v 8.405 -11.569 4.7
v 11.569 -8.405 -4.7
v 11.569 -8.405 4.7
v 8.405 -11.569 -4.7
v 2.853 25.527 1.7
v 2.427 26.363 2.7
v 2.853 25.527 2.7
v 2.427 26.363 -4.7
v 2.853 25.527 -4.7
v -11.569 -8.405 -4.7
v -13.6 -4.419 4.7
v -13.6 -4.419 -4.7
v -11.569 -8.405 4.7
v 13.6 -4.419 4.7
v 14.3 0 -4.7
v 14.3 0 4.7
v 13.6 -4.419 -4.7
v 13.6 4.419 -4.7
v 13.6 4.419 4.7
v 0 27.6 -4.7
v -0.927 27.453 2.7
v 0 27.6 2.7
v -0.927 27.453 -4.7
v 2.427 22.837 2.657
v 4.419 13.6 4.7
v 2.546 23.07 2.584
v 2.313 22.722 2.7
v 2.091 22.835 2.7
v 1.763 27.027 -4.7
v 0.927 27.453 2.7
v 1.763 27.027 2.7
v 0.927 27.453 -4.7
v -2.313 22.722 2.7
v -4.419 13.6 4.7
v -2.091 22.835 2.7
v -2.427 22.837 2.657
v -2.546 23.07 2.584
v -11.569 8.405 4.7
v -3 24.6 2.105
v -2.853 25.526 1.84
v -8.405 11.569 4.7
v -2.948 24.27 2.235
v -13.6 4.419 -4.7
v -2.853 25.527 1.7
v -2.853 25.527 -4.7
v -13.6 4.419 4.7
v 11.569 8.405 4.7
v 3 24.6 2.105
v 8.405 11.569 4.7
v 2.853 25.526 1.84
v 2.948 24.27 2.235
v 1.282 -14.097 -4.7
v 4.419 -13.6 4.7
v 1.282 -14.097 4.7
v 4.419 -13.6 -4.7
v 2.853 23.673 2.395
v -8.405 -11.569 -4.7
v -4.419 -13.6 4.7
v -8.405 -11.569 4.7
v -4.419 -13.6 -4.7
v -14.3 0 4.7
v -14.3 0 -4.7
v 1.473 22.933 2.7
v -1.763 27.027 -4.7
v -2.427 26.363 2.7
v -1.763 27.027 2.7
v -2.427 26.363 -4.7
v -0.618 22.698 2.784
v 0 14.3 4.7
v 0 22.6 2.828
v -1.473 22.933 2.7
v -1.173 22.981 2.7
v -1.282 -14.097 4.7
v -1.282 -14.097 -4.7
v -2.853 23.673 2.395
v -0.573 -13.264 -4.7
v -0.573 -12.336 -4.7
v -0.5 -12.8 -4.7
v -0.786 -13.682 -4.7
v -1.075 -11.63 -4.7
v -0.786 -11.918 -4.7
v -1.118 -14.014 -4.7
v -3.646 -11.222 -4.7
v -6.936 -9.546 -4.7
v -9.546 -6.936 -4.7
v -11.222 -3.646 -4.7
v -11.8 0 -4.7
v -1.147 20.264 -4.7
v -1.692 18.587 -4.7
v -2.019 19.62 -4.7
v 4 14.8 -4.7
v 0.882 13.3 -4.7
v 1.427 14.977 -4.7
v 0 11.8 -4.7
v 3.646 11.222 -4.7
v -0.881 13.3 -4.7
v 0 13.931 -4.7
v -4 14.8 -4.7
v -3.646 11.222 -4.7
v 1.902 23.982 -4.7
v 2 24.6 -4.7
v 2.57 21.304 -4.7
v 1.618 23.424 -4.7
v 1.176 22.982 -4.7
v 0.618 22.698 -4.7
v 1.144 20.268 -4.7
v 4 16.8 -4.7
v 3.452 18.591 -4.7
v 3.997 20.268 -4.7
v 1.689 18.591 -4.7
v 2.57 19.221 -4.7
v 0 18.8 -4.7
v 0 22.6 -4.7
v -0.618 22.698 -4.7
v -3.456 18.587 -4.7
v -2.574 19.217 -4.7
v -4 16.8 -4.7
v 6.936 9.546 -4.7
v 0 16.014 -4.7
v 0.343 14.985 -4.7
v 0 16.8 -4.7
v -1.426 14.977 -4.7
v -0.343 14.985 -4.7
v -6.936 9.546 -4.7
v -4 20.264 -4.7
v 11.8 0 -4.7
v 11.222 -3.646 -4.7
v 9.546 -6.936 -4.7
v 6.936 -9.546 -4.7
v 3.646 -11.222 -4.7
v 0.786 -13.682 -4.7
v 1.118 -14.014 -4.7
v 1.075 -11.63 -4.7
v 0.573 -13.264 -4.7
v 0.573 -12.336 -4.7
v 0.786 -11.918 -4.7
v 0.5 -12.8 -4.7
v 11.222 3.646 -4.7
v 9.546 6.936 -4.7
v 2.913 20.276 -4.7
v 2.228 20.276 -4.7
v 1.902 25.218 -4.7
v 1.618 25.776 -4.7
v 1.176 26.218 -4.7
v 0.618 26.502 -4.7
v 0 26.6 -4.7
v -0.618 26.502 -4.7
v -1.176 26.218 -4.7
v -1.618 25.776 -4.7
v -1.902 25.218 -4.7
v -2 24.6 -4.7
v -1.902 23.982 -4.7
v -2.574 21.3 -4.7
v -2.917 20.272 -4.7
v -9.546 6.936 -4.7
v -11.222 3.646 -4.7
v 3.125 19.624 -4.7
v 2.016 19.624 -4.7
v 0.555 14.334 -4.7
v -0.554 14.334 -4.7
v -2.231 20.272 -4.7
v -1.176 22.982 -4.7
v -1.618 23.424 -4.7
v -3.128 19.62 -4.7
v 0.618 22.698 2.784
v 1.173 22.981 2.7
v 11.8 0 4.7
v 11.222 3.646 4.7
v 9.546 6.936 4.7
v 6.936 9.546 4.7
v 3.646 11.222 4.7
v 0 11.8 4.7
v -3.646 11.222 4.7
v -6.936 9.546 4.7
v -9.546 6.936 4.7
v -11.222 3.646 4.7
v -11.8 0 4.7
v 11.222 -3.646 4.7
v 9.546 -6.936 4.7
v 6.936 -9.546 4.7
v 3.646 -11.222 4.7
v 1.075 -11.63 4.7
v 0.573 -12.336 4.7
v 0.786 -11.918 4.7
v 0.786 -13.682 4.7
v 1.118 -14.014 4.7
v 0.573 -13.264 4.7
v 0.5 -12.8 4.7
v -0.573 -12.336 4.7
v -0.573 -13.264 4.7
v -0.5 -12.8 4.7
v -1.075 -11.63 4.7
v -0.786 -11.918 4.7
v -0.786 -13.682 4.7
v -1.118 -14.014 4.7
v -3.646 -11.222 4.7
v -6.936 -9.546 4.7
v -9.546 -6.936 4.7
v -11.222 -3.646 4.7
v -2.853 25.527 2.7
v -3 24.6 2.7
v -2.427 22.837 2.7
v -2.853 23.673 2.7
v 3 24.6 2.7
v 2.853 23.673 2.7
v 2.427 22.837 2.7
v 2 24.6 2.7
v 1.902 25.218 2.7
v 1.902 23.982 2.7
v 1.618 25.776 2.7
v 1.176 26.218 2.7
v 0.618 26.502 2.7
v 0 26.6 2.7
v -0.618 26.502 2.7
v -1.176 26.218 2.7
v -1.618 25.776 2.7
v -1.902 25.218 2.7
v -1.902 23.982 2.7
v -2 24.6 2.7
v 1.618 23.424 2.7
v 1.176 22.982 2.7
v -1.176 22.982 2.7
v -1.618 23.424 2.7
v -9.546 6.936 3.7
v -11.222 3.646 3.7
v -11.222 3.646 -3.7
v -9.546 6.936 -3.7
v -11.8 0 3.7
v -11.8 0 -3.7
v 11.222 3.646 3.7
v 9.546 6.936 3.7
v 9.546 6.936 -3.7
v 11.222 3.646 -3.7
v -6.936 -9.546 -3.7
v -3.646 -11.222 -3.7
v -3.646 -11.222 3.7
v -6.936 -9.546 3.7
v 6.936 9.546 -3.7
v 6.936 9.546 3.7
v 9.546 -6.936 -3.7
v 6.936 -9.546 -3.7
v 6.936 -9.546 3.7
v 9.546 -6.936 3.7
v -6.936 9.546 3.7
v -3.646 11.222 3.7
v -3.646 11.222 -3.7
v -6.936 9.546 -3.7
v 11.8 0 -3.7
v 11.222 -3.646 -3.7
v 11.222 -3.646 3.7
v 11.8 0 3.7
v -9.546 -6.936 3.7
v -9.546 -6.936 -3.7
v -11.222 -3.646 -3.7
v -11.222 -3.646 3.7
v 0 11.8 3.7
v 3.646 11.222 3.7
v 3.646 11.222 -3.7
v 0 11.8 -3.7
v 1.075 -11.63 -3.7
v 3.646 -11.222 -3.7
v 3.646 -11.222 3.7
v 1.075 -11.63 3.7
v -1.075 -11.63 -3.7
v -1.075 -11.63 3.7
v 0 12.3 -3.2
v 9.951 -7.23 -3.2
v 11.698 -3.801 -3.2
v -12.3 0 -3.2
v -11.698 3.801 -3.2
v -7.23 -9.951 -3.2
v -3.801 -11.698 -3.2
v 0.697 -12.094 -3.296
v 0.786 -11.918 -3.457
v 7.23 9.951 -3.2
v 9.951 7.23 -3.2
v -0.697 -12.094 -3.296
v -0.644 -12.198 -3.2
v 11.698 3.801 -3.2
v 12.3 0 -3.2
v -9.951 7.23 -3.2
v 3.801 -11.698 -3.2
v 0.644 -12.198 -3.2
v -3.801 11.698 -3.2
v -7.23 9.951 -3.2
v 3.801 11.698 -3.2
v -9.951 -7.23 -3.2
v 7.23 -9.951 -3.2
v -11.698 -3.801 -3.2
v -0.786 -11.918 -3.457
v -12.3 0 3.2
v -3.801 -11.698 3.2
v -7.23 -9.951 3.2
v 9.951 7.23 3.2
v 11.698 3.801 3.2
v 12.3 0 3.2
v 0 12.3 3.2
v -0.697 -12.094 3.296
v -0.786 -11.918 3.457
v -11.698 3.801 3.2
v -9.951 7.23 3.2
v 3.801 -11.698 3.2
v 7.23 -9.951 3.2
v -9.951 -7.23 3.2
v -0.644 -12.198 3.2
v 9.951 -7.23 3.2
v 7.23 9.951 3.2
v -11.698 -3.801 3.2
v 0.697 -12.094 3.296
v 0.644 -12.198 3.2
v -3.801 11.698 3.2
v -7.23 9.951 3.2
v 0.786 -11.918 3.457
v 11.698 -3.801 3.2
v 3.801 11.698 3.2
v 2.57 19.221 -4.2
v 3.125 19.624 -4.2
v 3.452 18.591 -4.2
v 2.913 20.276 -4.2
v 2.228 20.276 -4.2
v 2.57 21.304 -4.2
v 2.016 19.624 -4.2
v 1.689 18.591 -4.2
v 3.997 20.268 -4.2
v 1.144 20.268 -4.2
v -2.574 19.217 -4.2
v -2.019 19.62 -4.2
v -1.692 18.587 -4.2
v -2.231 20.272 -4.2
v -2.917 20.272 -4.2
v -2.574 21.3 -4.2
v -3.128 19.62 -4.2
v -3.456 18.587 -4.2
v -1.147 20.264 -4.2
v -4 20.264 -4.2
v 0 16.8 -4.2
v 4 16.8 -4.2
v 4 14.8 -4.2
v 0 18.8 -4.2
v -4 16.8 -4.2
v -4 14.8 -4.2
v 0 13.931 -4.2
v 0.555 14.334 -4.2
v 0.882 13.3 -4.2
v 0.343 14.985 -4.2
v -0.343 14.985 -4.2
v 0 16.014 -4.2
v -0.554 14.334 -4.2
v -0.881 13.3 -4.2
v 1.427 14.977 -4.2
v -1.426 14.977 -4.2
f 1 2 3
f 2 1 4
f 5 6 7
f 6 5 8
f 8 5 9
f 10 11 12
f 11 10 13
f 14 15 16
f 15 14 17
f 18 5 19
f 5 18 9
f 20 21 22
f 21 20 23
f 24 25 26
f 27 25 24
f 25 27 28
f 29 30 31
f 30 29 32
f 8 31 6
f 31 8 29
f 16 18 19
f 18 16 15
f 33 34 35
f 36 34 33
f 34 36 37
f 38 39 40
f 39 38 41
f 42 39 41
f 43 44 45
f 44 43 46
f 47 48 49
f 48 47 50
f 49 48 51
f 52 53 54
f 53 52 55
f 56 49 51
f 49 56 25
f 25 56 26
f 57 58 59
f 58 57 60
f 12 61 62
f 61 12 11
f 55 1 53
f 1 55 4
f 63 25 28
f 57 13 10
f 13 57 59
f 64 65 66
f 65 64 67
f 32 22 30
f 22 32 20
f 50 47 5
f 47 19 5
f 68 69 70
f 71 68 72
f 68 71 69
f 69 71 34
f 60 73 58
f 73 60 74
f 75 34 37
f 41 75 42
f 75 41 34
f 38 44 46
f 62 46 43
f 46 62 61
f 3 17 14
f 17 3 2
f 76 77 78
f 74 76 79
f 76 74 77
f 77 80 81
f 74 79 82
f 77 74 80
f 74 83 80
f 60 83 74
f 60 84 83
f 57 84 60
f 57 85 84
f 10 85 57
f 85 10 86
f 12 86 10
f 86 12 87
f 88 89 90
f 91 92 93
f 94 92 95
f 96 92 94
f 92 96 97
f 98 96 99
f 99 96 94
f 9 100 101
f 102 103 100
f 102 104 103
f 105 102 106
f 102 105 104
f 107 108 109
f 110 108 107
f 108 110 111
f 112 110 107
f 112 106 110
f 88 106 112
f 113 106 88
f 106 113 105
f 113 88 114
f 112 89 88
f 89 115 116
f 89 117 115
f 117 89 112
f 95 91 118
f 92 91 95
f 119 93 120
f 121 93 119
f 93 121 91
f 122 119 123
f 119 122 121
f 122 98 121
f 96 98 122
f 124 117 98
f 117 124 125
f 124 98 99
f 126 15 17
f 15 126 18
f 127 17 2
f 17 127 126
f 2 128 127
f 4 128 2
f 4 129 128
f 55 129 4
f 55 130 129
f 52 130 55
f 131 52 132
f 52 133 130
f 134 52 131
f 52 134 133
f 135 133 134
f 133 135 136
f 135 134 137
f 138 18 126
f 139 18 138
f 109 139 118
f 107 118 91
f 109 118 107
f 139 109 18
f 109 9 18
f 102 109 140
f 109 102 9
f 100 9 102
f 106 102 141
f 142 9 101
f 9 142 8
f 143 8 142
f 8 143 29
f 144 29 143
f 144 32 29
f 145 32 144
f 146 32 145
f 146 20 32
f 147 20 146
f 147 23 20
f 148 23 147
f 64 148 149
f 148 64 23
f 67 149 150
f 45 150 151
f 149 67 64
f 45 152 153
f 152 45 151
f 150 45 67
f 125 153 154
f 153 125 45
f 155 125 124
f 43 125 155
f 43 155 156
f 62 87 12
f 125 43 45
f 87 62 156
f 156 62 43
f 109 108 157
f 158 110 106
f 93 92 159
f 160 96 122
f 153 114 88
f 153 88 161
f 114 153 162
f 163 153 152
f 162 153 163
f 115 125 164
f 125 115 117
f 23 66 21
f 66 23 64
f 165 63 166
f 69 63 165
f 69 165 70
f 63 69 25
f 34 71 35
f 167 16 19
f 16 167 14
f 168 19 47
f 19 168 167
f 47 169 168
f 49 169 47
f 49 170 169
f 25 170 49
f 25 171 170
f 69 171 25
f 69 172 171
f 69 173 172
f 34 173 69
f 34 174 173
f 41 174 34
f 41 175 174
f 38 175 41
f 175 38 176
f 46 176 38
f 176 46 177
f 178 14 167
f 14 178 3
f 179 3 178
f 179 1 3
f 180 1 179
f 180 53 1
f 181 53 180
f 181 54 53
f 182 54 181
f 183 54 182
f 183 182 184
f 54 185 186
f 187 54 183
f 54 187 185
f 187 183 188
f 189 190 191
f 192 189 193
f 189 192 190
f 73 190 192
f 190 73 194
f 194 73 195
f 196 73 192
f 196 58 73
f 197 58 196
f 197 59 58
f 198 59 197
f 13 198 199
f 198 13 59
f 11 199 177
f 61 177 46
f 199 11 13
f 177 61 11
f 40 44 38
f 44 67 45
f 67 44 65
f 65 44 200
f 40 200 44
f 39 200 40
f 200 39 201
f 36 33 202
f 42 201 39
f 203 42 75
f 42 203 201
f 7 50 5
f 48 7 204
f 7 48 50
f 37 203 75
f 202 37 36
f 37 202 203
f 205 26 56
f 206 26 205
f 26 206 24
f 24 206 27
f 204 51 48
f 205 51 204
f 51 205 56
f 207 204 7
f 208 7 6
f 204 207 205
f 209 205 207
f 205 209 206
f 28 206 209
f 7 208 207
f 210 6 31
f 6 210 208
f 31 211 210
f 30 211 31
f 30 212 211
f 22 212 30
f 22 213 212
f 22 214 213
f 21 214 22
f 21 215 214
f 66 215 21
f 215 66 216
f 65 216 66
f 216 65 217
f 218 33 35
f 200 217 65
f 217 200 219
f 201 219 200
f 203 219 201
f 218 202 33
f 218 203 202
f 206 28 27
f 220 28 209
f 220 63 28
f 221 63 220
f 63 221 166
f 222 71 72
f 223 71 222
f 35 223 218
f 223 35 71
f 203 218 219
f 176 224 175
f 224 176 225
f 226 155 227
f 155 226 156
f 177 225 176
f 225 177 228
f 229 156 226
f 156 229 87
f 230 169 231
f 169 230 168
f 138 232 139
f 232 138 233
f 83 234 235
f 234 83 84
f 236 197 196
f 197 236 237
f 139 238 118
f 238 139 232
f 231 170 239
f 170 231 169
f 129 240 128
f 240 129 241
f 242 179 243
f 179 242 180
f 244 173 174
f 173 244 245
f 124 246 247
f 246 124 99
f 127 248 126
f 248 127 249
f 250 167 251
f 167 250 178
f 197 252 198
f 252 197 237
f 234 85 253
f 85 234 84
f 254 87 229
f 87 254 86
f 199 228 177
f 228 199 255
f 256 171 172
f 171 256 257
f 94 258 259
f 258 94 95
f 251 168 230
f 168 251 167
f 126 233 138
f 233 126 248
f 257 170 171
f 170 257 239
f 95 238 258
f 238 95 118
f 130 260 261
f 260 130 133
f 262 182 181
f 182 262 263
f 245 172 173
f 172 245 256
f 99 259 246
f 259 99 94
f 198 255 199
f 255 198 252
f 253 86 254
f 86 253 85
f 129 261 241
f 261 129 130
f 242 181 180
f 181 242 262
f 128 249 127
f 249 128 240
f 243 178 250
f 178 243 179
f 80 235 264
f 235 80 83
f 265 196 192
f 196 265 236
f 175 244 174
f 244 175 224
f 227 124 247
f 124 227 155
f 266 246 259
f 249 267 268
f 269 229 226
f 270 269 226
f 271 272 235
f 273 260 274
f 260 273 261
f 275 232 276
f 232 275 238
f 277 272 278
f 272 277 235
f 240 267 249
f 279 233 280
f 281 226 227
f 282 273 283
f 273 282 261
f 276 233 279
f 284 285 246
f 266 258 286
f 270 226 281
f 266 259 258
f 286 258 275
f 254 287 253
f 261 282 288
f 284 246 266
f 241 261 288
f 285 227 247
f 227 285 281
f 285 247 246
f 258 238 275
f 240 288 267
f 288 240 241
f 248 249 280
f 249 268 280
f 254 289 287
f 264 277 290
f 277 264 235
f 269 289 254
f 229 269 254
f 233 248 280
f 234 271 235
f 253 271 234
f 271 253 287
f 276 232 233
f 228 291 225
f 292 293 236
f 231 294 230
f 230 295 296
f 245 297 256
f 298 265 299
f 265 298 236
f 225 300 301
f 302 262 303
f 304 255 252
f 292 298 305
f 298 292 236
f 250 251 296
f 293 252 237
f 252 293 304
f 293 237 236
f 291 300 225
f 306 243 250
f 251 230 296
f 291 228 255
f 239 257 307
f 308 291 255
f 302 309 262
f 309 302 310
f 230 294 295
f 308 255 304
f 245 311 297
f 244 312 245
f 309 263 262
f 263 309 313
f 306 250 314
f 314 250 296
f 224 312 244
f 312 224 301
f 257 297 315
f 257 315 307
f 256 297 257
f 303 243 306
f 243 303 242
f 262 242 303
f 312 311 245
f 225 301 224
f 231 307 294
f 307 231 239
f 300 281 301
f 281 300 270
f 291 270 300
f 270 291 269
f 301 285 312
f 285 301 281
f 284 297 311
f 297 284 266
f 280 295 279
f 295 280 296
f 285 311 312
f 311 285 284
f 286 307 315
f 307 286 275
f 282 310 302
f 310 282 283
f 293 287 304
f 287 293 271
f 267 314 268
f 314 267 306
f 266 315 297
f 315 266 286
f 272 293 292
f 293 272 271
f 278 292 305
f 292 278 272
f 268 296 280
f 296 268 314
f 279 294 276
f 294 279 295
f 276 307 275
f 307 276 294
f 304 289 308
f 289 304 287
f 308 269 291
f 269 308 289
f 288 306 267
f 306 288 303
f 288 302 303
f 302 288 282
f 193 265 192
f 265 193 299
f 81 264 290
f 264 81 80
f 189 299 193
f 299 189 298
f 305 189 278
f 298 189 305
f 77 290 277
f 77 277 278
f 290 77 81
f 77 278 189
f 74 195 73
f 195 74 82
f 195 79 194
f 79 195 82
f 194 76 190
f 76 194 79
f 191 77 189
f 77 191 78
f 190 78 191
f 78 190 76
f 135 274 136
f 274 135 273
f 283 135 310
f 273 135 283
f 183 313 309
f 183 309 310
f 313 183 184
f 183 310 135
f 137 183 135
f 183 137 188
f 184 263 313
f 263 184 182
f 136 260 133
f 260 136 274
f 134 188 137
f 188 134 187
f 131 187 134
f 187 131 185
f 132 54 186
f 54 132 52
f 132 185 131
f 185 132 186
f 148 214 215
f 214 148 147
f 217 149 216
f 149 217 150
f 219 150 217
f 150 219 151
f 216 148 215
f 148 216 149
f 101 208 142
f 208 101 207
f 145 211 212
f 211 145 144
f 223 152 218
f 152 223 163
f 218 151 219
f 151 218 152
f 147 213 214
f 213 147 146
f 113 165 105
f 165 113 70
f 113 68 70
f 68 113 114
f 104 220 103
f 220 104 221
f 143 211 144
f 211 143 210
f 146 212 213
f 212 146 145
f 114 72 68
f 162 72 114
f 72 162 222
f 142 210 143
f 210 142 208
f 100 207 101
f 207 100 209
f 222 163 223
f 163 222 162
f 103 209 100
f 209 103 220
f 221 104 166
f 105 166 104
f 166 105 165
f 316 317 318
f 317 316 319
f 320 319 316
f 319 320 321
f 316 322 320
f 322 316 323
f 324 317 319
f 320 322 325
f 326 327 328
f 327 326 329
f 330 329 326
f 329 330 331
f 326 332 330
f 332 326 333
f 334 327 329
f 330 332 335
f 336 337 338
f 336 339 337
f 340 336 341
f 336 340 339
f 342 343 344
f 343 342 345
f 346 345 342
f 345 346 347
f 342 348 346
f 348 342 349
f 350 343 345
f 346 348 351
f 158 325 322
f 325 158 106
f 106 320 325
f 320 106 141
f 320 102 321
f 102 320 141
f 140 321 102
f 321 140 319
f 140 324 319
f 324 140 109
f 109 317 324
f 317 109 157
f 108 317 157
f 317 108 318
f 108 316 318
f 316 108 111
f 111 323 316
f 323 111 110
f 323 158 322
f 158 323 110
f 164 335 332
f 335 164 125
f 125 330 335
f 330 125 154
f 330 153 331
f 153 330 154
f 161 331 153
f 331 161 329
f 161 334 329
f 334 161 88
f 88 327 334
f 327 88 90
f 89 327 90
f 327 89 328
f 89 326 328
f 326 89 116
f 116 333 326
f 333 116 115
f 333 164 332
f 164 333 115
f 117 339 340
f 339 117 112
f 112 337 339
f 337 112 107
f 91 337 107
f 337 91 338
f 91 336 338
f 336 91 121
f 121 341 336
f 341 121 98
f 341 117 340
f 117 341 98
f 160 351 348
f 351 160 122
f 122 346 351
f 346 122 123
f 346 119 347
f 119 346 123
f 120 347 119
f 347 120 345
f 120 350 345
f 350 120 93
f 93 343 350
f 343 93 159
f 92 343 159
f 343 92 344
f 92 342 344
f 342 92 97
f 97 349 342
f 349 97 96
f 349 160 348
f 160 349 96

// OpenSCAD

CoinDiameter=24.6; // US Quarter Dollar
CoinThickness=3.7/2; // US Quarter Dollar
CoinQty=4;
HangerHoleDiameter=4;
ApertureDiameter=CoinDiameter-1;
SideMount=0;
LogoSize=10;
$fn=20;

CoinHeight=CoinThickness*CoinQty;

module CC_Tag(Size=10,Thickness=1, Center=true, DoBorder=true){
 linear_extrude(height=Thickness,center=Center)
 scale([2.54/90*Size/10, -2.54/90*Size/10, 1]) union() {
  polygon([[-0.006525,-53.156145],[-141.738804,17.709995],[-141.738804,88.576135],[-0.006525,17.709995],[141.725765,88.576135],[141.725765,17.709995]]); // Chevron
  polygon([[-0.006525,45.577248],[12.137625,82.011868],[50.541755,82.302728],[19.643125,105.111418],[31.234025,141.725798],[-0.006535,119.387728],[-31.247095,141.725798],[-19.656185,105.111418],[-50.554815,82.302728],[-12.150685,82.011868]]); //Bottom star
 polygon([[91.200672,-141.742850],[103.344822,-105.308230],[141.748952,-105.017370],[110.850322,-82.208680],[122.441222,-45.594300],[91.200662,-67.932370],[59.960102,-45.594300],[71.551012,-82.208680],[40.652382,-105.017370],[79.056512,-105.308230]]);
 polygon([[-91.078056,-141.883062],[-78.933906,-105.448442],[-40.529776,-105.157582],[-71.428406,-82.348892],[-59.837506,-45.734512],[-91.078066,-68.072582],[-122.318626,-45.734512],[-110.727716,-82.348892],[-141.626346,-105.157582],[-103.222216,-105.448442]]);
 if (DoBorder)
 difference(){
  polygon([[-177.171875,-177.171875],[-177.171875,177.171875],[177.171875,177.171875],[177.171875,-177.171875],[-177.171875,-177.171875]]);
  polygon([[-159.453125,-159.453125],[159.453125,-159.453125],[159.453125,159.453125],[-159.453125,159.453125],[-159.453125,-159.453125]]);
  }
 }
}

rotate([0,180,0])
difference(){
 union() {
  hull(){
   cylinder(r=(CoinDiameter/2)+2,h=CoinHeight+2,center=true);
   translate([0,CoinDiameter,1.5*(1-SideMount)]) rotate([0,90*SideMount,0]) cylinder(r=(HangerHoleDiameter/2)+1,h=CoinHeight-1,center=true);
  }
  translate([0,CoinDiameter,1*(1-SideMount)]) rotate([0,90*SideMount,0]) cylinder(r=(HangerHoleDiameter/2)+1,h=CoinHeight,center=true);
 }

 translate([0,0,0])
 union(){
  color("red") cylinder(r=ApertureDiameter/2,h=CoinHeight+10, center=true);
  color("red") translate([0,0,CoinHeight/2-0.5]) cylinder(r1=CoinDiameter/2,r2=ApertureDiameter/2,h=0.5);
  color("red") translate([0,0,-CoinHeight/2]) cylinder(r2=CoinDiameter/2,r1=ApertureDiameter/2,h=0.5);
  color("red") cylinder(r=CoinDiameter/2, h=CoinHeight-1, center=true);
 }
 color("red") translate([0,CoinDiameter,0]) rotate([0,90*SideMount,0]) cylinder(r=HangerHoleDiameter/2,h=CoinHeight+10,center=true);
 translate([0,-CoinDiameter/2-0.5,0])
 difference(){
  color("red") cube([4,3,CoinHeight+10],center=true);
  color("blue") translate([2,0,0]) cylinder(r=1.5,h=CoinHeight+11,center=true);
  color("blue") translate([-2,0,0]) cylinder(r=1.5,h=CoinHeight+11,center=true);
 }

translate([0,CoinDiameter/2+LogoSize/2,CoinHeight/2+1]) CC_Tag(Size=LogoSize,center=true,DoBorder=false);
}
